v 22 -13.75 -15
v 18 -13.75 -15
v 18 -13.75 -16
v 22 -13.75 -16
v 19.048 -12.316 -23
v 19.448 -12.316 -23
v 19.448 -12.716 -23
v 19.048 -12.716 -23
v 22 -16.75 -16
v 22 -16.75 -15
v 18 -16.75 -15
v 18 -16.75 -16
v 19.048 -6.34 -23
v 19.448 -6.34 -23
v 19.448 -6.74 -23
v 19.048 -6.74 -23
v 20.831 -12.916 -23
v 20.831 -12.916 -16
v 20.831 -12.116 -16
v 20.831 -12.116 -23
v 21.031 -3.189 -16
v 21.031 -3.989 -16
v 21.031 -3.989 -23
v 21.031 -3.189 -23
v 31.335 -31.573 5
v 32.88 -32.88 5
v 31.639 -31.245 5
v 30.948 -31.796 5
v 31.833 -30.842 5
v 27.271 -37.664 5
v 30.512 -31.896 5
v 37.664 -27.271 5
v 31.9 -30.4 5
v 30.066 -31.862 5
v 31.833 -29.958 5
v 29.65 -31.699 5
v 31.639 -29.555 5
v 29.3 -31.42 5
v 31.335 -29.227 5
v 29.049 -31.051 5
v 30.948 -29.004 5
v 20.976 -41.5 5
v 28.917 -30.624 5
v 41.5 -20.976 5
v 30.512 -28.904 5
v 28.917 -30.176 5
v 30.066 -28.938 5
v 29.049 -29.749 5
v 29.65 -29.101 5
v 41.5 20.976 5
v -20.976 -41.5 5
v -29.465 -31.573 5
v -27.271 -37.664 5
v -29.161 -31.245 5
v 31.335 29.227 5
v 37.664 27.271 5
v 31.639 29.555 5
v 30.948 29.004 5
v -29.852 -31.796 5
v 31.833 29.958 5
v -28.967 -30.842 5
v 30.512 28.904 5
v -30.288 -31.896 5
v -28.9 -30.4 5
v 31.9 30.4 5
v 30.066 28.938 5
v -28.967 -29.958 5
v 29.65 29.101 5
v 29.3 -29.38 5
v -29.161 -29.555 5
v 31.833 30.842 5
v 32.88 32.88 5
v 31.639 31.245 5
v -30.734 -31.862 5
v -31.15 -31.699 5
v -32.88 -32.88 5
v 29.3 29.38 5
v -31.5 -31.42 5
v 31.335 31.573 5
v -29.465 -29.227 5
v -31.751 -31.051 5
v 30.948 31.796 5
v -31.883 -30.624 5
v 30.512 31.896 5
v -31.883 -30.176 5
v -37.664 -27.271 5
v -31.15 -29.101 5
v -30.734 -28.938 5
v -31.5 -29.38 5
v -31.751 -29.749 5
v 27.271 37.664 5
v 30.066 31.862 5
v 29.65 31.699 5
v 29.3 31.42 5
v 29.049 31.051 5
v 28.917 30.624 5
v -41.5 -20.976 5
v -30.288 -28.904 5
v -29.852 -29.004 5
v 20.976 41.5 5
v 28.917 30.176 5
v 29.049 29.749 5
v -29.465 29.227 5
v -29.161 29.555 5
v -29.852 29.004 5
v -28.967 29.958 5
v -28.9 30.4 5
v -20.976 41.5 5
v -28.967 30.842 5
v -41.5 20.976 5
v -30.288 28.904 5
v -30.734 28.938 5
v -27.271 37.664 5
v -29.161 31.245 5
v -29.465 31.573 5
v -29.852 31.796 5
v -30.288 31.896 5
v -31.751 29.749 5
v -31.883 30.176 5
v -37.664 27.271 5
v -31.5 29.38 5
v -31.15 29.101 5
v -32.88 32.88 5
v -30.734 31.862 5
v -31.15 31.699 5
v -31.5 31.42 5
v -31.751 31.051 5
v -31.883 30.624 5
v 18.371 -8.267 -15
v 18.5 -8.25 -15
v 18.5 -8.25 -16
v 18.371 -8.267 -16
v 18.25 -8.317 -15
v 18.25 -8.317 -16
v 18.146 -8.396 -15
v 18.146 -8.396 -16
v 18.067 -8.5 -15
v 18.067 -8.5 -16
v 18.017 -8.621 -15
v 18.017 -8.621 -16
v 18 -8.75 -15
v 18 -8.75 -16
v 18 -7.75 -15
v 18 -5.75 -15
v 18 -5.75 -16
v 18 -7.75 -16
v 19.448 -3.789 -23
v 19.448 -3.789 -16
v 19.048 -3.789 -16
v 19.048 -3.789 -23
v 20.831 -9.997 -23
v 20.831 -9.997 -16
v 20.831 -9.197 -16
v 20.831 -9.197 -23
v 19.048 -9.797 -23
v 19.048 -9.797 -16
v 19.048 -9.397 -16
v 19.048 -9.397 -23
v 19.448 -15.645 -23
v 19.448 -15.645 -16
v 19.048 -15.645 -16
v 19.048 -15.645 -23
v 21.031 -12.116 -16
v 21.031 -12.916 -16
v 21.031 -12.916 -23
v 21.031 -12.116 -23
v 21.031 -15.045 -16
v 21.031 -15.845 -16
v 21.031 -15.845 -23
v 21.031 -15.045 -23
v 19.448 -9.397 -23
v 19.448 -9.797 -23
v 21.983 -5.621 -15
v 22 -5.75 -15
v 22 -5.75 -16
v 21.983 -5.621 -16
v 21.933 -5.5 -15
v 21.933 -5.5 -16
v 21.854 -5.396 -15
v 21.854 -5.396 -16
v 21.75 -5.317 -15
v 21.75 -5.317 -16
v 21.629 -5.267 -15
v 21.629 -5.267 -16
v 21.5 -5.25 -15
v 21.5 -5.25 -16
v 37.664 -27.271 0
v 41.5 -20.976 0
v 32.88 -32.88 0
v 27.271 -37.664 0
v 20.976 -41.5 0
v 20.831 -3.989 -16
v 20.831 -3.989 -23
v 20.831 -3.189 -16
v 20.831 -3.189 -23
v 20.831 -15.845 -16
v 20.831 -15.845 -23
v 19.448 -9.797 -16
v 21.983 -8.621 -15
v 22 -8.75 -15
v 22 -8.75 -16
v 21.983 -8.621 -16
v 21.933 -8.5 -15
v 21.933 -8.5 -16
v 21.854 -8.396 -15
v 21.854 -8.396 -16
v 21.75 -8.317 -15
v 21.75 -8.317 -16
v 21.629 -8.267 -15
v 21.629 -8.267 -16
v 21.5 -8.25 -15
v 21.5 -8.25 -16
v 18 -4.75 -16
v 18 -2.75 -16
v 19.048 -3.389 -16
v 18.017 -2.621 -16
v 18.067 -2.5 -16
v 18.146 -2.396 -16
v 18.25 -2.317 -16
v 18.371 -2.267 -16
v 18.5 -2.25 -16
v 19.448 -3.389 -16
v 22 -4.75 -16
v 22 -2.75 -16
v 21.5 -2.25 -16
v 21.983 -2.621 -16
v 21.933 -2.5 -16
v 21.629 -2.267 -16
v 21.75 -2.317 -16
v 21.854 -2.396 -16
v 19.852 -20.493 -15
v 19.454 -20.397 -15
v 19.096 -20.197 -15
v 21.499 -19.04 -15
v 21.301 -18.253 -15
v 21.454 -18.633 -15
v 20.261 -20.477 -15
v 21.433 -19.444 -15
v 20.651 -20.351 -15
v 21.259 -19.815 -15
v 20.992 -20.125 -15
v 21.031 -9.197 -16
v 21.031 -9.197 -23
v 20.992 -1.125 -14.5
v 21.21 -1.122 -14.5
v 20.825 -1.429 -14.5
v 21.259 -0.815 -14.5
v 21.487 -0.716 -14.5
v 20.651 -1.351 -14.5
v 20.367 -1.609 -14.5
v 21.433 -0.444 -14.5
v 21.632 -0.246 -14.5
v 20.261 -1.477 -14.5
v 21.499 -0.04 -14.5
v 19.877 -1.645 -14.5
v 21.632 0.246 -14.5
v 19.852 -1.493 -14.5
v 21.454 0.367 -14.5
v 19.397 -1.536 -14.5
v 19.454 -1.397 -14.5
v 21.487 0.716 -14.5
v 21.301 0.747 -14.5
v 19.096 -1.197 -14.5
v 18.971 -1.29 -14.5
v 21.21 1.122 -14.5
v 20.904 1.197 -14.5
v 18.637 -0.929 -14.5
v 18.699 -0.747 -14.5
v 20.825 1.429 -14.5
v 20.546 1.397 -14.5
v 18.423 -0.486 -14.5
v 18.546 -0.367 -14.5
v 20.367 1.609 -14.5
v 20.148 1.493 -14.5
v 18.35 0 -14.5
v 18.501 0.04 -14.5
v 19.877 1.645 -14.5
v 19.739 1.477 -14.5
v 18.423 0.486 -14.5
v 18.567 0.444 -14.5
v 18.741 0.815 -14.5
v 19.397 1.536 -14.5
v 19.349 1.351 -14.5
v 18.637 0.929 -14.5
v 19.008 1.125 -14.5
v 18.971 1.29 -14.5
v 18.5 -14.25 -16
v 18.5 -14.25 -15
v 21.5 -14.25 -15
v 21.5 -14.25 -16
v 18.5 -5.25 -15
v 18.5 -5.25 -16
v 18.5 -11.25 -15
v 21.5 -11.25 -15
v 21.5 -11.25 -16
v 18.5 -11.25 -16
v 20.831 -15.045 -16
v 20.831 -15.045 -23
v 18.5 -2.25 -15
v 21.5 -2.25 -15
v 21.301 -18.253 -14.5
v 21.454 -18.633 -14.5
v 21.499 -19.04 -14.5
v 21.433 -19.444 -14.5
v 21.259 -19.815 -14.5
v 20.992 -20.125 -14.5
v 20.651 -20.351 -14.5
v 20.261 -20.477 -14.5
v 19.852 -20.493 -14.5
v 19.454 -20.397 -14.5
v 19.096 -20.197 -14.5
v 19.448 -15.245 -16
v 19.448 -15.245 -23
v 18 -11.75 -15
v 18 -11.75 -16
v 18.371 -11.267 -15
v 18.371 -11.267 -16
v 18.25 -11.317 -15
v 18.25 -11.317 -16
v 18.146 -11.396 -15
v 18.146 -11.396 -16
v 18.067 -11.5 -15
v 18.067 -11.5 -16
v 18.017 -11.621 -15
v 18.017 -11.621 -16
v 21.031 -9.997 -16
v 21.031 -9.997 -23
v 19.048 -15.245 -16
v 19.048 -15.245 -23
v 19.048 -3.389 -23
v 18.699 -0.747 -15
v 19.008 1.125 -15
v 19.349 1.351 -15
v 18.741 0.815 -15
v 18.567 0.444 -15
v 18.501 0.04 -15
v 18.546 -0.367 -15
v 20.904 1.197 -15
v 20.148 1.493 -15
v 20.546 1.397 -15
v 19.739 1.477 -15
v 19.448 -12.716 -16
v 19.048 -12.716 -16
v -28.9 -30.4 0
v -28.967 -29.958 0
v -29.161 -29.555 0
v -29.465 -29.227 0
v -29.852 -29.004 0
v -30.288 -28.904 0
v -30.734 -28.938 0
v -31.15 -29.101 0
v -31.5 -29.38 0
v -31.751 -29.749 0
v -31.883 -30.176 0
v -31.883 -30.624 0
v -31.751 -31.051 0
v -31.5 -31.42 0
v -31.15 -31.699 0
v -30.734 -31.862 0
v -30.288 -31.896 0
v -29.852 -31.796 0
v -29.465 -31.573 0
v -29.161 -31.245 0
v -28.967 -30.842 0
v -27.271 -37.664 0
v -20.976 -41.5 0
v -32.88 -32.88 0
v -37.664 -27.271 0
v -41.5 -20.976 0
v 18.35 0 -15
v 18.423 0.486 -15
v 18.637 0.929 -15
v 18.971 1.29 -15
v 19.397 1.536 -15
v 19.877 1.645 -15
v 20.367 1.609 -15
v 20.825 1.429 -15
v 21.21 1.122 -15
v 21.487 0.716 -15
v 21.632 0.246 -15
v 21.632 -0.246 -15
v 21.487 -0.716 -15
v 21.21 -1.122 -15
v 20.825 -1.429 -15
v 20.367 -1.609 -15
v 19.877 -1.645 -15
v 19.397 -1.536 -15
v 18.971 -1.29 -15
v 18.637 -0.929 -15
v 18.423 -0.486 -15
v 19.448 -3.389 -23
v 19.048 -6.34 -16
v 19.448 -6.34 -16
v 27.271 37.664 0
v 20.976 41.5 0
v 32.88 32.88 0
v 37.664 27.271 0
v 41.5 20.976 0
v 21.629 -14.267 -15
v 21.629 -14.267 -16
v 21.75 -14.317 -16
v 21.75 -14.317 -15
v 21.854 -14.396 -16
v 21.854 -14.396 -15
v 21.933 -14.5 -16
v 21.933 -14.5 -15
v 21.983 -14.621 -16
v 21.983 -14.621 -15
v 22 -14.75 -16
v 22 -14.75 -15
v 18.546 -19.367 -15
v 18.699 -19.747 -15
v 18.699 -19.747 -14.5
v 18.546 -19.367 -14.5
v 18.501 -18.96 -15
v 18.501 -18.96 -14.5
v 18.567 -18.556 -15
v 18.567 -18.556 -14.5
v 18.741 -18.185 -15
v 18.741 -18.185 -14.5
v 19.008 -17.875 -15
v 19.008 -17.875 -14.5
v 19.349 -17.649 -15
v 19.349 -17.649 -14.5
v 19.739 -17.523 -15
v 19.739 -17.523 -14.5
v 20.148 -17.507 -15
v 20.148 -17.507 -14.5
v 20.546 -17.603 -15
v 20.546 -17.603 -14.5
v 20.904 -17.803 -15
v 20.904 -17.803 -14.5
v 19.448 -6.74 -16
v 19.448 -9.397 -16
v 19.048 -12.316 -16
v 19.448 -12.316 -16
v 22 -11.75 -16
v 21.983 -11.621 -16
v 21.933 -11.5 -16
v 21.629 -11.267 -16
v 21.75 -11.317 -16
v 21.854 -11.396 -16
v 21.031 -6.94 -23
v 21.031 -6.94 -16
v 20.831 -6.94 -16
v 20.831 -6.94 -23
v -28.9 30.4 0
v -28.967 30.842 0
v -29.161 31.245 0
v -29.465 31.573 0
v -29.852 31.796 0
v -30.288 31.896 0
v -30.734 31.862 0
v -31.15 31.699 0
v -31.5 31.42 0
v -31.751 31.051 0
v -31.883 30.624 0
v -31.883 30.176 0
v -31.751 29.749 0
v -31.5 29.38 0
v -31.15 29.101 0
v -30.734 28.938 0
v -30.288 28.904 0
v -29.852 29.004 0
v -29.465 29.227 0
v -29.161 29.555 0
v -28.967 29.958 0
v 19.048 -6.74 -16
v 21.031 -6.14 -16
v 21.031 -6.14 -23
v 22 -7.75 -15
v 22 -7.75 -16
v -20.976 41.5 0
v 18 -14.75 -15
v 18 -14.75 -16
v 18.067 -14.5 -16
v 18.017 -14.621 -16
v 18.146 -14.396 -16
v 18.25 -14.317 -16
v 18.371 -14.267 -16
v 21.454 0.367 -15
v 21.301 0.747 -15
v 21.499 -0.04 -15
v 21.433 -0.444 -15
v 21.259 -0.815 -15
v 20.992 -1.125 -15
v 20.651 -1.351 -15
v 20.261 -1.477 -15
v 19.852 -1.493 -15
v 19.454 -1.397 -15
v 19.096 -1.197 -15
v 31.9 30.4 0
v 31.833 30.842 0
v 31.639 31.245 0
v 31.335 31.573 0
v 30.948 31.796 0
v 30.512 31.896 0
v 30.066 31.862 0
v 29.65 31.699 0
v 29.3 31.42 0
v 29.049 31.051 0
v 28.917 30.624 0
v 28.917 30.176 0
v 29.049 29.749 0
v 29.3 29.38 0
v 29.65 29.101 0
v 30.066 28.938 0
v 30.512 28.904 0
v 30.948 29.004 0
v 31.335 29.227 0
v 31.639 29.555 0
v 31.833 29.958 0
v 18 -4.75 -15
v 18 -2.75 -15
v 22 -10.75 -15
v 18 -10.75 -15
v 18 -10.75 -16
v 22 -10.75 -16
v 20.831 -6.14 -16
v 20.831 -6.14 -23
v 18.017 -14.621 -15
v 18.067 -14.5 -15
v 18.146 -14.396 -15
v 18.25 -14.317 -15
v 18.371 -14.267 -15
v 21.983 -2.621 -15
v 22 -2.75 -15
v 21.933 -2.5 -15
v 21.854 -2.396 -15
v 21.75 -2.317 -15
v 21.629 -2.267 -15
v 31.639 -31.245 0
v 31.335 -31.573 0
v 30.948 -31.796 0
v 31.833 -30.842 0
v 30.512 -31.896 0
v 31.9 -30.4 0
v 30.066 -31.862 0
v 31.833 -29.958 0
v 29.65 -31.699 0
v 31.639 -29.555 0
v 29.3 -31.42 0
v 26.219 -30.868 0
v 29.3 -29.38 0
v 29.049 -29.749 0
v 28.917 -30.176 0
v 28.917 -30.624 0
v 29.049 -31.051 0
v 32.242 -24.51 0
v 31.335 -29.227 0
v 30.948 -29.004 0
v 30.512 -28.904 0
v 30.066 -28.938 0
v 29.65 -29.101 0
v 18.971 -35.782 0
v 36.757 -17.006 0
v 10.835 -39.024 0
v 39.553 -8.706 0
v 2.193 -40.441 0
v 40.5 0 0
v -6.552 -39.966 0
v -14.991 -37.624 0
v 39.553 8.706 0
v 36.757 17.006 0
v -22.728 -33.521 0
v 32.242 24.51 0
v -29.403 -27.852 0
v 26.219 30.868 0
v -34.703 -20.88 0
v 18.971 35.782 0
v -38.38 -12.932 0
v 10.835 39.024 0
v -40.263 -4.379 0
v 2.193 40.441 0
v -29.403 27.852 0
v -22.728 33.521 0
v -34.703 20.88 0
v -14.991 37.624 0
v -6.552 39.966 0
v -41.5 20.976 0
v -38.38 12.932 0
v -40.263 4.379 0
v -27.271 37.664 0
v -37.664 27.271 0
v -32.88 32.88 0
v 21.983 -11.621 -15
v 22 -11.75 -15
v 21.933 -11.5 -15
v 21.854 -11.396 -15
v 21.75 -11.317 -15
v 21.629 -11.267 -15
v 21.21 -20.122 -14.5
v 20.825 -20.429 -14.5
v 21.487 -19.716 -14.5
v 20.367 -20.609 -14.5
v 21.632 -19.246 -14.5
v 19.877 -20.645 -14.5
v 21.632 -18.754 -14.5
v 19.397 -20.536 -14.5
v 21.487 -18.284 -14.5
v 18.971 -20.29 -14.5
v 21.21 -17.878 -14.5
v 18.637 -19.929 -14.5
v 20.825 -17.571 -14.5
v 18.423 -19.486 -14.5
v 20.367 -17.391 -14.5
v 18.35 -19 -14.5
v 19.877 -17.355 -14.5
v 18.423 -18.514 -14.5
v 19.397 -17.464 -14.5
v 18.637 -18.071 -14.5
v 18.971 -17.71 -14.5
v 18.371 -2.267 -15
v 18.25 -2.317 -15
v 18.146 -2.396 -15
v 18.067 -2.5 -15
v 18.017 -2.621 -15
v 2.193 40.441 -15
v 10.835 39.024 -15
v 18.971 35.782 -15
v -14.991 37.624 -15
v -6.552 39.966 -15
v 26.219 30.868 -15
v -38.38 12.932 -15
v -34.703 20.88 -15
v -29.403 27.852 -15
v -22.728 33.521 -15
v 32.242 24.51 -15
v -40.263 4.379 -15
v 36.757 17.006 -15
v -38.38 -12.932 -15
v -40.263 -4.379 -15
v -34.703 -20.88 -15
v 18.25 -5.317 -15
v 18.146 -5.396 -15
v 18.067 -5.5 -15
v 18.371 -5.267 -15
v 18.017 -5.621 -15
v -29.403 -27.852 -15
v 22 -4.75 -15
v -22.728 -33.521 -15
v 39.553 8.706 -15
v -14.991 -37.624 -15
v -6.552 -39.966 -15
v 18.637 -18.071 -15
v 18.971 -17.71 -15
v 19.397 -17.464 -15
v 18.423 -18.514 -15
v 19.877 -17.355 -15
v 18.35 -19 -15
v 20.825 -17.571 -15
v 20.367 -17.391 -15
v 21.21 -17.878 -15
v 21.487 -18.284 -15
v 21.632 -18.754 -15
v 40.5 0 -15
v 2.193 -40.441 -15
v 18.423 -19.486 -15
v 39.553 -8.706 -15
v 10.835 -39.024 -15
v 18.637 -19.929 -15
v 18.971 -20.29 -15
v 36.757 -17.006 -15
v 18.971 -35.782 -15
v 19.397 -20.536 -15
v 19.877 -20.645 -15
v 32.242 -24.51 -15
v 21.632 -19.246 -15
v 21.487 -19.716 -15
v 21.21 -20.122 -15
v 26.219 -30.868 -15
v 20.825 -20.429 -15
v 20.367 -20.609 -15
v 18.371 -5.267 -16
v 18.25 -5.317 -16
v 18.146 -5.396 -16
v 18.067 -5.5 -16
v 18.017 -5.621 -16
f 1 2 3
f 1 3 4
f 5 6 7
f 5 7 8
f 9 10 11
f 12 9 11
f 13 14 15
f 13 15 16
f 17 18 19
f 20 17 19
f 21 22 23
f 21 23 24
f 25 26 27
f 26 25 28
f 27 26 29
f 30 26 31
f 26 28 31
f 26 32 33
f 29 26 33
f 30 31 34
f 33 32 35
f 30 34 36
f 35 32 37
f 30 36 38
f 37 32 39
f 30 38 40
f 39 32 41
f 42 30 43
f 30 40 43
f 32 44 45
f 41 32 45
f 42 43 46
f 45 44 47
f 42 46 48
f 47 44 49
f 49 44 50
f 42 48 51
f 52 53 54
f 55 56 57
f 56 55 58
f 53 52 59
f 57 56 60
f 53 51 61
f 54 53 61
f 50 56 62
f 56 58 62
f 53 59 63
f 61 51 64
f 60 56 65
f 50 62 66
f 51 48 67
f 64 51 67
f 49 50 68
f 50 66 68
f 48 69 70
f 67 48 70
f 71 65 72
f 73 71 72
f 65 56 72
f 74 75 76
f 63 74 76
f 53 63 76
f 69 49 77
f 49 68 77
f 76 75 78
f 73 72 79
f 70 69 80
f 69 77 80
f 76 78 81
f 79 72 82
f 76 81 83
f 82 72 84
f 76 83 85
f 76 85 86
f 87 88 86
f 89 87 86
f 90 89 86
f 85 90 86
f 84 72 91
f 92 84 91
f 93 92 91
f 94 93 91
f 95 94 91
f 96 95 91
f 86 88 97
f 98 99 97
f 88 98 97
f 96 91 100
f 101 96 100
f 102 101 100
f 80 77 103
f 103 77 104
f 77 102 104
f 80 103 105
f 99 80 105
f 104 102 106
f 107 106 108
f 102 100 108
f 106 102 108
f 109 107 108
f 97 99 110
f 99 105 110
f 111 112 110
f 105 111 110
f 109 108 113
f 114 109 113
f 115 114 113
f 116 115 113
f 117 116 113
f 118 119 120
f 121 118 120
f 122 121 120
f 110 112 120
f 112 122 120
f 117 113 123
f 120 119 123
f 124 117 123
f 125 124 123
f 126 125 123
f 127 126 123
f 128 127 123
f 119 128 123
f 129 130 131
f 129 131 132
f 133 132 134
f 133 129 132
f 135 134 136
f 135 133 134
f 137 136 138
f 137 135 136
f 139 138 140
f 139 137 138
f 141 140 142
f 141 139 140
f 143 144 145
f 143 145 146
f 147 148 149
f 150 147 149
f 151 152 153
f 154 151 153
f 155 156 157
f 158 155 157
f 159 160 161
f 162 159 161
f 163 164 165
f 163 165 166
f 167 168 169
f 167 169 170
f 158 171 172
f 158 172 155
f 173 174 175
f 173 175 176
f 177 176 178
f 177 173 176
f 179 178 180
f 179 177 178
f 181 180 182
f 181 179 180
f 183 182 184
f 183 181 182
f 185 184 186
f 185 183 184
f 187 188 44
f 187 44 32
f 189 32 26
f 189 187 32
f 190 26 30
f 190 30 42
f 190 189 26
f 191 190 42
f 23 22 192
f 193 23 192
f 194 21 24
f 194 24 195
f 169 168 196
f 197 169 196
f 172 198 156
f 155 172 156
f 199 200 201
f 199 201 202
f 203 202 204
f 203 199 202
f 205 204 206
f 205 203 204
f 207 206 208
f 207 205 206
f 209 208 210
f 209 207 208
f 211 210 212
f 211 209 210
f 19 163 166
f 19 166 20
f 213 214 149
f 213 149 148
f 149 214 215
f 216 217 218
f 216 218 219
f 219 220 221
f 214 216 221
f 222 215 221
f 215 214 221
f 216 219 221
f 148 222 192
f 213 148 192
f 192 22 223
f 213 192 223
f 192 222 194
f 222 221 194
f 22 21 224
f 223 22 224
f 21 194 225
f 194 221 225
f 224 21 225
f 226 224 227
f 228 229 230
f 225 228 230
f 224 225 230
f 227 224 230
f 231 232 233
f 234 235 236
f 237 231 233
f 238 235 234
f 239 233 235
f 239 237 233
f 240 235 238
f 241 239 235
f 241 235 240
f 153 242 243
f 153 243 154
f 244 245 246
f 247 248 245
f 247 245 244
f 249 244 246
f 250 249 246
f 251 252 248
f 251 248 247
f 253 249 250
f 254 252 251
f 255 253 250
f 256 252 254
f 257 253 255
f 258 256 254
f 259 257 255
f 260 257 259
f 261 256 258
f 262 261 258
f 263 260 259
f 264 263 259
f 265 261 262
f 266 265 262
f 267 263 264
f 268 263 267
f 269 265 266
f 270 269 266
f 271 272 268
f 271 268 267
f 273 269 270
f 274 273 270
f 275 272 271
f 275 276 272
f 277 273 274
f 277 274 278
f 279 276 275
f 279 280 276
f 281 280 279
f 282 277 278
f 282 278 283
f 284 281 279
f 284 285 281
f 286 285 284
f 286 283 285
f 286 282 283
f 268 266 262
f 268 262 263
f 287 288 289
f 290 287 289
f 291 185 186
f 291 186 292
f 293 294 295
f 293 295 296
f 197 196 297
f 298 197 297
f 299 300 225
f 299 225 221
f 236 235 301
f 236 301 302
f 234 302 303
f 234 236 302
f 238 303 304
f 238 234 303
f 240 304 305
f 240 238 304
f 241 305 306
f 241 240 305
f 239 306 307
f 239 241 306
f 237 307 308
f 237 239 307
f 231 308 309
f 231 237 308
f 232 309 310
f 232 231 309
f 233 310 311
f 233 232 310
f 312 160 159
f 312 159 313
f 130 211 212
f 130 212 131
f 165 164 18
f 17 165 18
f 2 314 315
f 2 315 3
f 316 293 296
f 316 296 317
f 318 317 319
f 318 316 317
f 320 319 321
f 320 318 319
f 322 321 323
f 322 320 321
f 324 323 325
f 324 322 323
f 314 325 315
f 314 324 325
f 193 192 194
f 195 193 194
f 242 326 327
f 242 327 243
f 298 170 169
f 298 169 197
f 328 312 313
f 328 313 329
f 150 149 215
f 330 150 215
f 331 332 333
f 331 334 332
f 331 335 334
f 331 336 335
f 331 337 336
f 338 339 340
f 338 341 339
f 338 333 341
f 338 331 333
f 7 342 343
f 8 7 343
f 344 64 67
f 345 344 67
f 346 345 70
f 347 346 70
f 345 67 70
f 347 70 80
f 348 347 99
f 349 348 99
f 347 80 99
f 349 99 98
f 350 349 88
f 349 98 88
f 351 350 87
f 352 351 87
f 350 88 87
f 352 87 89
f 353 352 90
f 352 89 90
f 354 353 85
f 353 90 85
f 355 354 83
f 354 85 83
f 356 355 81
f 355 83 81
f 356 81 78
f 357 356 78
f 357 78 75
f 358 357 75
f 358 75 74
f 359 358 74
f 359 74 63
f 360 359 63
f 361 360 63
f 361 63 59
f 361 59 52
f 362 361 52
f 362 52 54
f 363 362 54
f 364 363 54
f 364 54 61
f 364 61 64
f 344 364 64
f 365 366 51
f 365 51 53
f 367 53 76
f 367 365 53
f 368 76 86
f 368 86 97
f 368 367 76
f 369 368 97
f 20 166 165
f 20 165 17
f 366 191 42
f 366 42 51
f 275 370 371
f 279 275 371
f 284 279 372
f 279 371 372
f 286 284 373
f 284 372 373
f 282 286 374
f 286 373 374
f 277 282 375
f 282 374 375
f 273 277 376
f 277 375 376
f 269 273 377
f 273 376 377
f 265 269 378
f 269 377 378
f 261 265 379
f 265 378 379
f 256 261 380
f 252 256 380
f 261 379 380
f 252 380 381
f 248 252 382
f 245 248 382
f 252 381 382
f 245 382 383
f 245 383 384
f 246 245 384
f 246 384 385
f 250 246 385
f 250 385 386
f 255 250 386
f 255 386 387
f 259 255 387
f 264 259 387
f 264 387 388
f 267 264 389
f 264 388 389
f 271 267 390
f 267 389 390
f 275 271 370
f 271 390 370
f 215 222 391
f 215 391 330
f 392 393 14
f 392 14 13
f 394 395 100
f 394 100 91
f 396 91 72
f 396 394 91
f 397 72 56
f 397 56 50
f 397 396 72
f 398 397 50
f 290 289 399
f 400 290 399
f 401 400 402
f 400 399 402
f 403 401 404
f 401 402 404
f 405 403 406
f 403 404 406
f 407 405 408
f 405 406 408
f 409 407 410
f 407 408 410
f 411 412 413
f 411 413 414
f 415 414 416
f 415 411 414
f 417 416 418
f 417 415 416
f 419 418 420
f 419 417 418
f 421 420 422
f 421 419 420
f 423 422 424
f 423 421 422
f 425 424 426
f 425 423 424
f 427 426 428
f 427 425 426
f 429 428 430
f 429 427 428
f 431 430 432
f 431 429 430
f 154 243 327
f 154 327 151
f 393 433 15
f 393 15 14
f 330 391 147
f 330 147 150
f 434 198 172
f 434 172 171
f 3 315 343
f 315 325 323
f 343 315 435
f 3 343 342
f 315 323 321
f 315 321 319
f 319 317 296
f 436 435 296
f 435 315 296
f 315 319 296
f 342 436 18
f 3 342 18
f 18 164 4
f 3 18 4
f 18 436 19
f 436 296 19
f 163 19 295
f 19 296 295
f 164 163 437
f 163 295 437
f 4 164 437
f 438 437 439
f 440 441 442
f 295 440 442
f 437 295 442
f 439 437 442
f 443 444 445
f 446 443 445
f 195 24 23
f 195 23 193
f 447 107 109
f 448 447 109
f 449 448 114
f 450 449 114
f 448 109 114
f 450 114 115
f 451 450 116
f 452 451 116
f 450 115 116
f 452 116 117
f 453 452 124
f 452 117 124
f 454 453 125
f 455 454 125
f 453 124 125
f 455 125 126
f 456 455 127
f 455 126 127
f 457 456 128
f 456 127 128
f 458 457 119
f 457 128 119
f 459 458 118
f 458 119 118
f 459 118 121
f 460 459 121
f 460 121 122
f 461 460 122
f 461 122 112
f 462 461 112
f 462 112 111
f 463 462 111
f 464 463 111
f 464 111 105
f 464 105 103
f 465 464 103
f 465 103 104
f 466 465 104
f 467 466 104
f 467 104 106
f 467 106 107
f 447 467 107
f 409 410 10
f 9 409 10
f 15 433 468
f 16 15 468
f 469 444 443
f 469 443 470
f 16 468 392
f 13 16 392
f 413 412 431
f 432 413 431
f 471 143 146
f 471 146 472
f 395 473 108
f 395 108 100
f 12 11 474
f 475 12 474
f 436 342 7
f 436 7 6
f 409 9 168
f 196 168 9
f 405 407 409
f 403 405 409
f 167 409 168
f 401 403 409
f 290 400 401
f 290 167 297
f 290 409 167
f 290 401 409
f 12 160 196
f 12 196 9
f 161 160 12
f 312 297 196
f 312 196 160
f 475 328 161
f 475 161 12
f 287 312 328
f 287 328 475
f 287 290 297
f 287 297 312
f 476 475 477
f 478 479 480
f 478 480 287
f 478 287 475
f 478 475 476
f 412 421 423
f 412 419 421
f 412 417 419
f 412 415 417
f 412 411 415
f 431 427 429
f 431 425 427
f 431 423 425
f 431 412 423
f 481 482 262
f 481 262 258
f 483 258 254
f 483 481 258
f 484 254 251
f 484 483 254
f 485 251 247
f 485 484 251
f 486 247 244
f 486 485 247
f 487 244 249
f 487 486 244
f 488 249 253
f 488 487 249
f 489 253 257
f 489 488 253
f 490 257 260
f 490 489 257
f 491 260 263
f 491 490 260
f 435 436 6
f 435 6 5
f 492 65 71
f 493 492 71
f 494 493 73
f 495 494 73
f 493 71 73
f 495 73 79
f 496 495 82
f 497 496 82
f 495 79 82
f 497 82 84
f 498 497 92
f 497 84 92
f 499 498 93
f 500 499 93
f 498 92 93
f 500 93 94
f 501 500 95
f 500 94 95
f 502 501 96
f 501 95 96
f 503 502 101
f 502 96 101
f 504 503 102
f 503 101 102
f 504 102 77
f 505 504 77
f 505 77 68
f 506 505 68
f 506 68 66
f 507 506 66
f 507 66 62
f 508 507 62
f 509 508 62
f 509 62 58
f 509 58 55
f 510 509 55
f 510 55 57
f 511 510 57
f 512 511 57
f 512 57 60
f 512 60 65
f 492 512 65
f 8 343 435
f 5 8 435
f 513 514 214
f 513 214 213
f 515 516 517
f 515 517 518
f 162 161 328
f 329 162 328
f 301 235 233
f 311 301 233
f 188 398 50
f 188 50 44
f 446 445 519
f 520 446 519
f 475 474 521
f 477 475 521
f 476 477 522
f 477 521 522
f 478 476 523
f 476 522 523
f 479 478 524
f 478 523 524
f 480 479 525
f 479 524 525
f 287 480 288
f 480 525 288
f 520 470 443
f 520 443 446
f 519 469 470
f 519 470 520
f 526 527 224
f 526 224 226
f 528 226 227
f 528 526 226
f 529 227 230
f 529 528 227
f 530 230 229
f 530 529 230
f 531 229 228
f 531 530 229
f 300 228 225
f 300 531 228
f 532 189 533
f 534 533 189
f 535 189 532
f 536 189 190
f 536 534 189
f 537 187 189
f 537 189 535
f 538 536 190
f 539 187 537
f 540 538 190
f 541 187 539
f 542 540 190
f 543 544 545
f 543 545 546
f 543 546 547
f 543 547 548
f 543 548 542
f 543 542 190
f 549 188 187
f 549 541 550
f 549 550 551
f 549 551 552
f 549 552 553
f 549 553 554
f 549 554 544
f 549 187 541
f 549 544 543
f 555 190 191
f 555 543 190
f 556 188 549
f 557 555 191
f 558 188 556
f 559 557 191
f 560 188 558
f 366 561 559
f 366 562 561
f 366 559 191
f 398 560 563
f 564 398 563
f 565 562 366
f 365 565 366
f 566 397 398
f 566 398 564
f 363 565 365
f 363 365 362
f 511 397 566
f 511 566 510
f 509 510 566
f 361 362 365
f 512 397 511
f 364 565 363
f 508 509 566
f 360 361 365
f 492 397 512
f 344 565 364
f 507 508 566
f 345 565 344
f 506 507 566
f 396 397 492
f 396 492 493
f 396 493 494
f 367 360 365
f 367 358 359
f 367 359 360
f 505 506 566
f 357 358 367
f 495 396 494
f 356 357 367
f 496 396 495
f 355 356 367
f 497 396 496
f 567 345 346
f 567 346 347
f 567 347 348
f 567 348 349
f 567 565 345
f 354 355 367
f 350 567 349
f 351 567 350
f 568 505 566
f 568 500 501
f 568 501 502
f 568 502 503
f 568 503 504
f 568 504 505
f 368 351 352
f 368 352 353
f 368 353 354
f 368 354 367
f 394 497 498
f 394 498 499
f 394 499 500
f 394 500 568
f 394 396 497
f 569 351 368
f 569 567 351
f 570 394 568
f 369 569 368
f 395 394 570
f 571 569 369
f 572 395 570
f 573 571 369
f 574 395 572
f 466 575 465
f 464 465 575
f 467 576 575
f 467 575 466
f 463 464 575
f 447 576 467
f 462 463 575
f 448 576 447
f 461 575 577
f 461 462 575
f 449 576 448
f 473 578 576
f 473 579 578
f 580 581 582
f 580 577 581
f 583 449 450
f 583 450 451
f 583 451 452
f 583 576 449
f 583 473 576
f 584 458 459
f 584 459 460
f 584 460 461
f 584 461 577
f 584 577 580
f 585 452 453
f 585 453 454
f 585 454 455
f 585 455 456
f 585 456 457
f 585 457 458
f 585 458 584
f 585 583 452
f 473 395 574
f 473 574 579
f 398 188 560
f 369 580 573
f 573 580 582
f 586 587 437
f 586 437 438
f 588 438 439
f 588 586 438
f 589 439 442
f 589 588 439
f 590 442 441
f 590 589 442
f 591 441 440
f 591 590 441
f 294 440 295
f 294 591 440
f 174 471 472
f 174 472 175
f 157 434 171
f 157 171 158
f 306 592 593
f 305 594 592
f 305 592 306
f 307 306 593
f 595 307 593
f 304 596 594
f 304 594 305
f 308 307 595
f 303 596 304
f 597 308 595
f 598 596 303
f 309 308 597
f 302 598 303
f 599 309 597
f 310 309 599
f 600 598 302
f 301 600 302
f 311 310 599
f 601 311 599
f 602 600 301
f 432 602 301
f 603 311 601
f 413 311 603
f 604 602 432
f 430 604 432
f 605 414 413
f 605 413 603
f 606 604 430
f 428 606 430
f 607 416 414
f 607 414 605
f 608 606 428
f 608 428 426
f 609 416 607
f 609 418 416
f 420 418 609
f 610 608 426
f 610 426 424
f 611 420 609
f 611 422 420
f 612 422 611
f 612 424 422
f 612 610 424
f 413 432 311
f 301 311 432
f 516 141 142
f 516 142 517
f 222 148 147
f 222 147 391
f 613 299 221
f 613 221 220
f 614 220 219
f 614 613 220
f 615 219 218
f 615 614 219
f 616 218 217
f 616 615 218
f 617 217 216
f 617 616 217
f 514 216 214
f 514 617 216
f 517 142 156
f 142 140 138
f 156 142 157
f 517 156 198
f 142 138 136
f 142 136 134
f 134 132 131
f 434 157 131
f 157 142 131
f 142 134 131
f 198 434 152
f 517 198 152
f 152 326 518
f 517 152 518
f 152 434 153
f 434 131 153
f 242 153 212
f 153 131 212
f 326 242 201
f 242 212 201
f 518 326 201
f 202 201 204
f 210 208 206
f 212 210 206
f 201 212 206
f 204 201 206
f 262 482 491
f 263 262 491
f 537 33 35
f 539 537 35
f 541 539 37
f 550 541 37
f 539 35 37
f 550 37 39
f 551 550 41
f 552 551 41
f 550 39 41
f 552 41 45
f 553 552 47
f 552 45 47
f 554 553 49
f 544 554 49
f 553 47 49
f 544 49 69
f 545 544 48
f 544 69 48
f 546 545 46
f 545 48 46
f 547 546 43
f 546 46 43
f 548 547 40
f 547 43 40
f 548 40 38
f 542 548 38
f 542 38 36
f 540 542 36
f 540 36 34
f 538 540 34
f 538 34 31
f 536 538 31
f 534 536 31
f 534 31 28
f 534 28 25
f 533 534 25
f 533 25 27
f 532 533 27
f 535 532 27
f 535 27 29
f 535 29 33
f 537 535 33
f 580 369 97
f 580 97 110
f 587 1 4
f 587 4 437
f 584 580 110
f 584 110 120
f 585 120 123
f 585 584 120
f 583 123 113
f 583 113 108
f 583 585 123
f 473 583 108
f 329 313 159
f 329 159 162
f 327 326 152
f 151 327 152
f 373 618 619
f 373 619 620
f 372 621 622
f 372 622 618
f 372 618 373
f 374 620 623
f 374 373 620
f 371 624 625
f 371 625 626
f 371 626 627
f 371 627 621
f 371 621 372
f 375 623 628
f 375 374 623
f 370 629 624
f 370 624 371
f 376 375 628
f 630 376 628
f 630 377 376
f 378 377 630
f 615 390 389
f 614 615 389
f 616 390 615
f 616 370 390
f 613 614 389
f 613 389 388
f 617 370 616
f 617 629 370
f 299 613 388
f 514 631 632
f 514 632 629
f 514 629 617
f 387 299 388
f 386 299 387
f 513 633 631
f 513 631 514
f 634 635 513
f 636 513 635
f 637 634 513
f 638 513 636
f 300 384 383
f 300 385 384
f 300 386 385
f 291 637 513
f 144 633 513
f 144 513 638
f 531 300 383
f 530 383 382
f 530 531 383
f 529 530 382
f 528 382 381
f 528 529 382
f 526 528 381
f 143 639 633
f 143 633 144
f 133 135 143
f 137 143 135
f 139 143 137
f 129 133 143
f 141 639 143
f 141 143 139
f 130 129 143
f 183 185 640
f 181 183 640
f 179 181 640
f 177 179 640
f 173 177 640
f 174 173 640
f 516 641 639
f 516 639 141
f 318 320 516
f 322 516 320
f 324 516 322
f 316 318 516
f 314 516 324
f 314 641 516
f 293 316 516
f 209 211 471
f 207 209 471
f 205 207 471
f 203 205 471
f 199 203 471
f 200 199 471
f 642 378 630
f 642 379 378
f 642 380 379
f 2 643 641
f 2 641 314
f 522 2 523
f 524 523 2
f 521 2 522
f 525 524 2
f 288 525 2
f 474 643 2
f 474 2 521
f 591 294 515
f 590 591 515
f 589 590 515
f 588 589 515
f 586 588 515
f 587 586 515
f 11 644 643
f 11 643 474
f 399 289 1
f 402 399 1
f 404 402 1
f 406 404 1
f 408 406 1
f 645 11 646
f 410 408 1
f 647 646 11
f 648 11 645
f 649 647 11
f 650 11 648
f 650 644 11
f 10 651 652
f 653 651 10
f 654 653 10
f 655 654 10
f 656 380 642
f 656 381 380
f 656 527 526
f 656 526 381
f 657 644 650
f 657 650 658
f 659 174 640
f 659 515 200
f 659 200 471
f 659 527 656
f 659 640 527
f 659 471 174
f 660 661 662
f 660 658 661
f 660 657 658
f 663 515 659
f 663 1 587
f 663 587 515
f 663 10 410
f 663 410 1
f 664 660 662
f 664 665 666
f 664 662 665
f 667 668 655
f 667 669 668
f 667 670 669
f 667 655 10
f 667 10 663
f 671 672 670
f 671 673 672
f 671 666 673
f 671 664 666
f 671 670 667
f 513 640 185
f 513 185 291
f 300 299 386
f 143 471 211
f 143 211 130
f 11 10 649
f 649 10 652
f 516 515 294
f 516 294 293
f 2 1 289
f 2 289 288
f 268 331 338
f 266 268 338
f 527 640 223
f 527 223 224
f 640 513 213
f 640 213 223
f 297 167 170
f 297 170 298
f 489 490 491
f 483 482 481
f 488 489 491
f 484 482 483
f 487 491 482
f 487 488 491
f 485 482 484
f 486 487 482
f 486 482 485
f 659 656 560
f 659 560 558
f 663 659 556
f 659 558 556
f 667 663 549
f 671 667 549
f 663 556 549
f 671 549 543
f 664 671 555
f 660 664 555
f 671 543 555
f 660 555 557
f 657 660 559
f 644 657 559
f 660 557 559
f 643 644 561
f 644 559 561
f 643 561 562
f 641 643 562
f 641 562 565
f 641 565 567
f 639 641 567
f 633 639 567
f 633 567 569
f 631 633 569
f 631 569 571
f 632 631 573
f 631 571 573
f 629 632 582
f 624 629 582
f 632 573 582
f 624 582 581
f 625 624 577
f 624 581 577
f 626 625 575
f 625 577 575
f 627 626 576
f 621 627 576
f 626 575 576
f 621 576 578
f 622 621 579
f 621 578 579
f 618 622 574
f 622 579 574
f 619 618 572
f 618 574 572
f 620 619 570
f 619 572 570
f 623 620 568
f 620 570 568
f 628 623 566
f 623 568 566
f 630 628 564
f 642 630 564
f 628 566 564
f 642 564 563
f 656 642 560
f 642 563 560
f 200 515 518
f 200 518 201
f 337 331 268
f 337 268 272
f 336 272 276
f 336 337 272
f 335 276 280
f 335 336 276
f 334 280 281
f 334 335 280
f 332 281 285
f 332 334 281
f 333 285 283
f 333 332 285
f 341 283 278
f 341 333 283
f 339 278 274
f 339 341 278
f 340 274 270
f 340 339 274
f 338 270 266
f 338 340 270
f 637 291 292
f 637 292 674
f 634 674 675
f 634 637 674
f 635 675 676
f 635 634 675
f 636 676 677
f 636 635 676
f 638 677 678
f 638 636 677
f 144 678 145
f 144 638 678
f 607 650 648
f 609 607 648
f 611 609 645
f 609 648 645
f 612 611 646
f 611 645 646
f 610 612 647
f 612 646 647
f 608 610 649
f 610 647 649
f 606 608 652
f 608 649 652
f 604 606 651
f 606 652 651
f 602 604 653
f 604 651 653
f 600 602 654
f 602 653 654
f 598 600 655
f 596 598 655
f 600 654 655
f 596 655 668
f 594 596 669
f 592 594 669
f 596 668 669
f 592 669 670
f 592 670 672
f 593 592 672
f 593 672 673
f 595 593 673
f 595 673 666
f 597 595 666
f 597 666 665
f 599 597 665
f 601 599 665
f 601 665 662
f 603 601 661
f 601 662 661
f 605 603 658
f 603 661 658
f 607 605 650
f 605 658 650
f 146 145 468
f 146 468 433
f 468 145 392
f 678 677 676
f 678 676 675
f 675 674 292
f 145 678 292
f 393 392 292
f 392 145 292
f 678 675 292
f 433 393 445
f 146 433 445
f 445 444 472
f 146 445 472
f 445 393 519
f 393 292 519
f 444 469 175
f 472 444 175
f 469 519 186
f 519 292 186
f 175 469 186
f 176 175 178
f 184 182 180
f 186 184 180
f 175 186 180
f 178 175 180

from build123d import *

# Parameters (mm, degrees)
EXTRUDE_1_DEPTH     = 5
SKETCH_2_R          = 1.5
CUT_EXTRUDE_1_DEPTH = 19
SKETCH_3_R          = 40.5
EXTRUDE_2_DEPTH     = 15
EXTRUDE_3_DEPTH     = 1
SKETCH_7_W          = 0.4
SKETCH_7_H          = 0.4
SKETCH_7_W_2        = 0.2
SKETCH_7_H_2        = 0.8
EXTRUDE_4_DEPTH     = 7
SKETCH_8_R          = 1.65
SKETCH_8_R_2        = 1.5
CUT_EXTRUDE_2_DEPTH = 0.5
CUT_EXTRUDE_3_DEPTH = 0.5


with BuildPart() as part:
    # 草图1 → 凸台-拉伸1 (new body)
    with BuildSketch(Plane.XY):
        with BuildLine():
            Line((-20.976176963, 41.5), (20.976176963, 41.5))
            ThreePointArc((20.976176963, 41.5), (32.880465325, 32.880465325), (41.5, 20.976176963))
            Line((41.5, 20.976176963), (41.5, -20.976176963))
            ThreePointArc((41.5, -20.976176963), (32.880465325, -32.880465325), (20.976176963, -41.5))
            Line((20.976176963, -41.5), (-20.976176963, -41.5))
            ThreePointArc((-20.976176963, -41.5), (-32.880465325, -32.880465325), (-41.5, -20.976176963))
            Line((-41.5, -20.976176963), (-41.5, 20.976176963))
            ThreePointArc((-41.5, 20.976176963), (-32.880465325, 32.880465325), (-20.976176963, 41.5))
        make_face()
    extrude(amount=EXTRUDE_1_DEPTH)

    # 草图2 → 切除-拉伸1 (cut)
    with BuildSketch(Plane.XY.offset(5)):
        with Locations((-30.4, 30.4)):
            Circle(SKETCH_2_R)
        with Locations((30.4, 30.4)):
            Circle(SKETCH_2_R)
        with Locations((30.4, -30.4)):
            Circle(SKETCH_2_R)
        with Locations((-30.4, -30.4)):
            Circle(SKETCH_2_R)
    extrude(amount=-CUT_EXTRUDE_1_DEPTH, mode=Mode.SUBTRACT)

    # 草图3 → 凸台-拉伸2 (add)
    with BuildSketch(Plane(origin=(0, 0, 0), x_dir=(-1, 0, 0), z_dir=(0, 0, -1))):
        with Locations(Location((0, 0, 0), (0, 0, 180))):
            Circle(SKETCH_3_R)
    extrude(amount=EXTRUDE_2_DEPTH)

    # 草图6 → 凸台-拉伸3 (add)
    with BuildSketch(Plane(origin=(0, 0, -15), x_dir=(-1, 0, 0), z_dir=(0, 0, -1))):
        with BuildLine():
            Line((-18, -5.75), (-18, -7.75))
            Line((-18, -7.75), (-22, -7.75))
            Line((-22, -7.75), (-22, -5.75))
            ThreePointArc((-22, -5.75), (-21.853553391, -5.396446609), (-21.5, -5.25))
            Line((-21.5, -5.25), (-18.5, -5.25))
            ThreePointArc((-18.5, -5.25), (-18.146446609, -5.396446609), (-18, -5.75))
        make_face()
        with BuildLine():
            Line((-21.5, -8.25), (-18.5, -8.25))
            ThreePointArc((-18.5, -8.25), (-18.146446609, -8.396446609), (-18, -8.75))
            Line((-18, -8.75), (-18, -10.75))
            Line((-18, -10.75), (-22, -10.75))
            Line((-22, -10.75), (-22, -8.75))
            ThreePointArc((-22, -8.75), (-21.853553391, -8.396446609), (-21.5, -8.25))
        make_face()
        with BuildLine():
            Line((-18, -2.75), (-18, -4.75))
            Line((-18, -4.75), (-22, -4.75))
            Line((-22, -4.75), (-22, -2.75))
            ThreePointArc((-22, -2.75), (-21.853553391, -2.396446609), (-21.5, -2.25))
            Line((-21.5, -2.25), (-18.5, -2.25))
            ThreePointArc((-18.5, -2.25), (-18.146446609, -2.396446609), (-18, -2.75))
        make_face()
        with BuildLine():
            Line((-21.5, -11.25), (-18.5, -11.25))
            ThreePointArc((-18.5, -11.25), (-18.146446609, -11.396446609), (-18, -11.75))
            Line((-18, -11.75), (-18, -13.75))
            Line((-18, -13.75), (-22, -13.75))
            Line((-22, -13.75), (-22, -11.75))
            ThreePointArc((-22, -11.75), (-21.853553391, -11.396446609), (-21.5, -11.25))
        make_face()
        with BuildLine():
            Line((-22, -14.75), (-22, -16.75))
            Line((-22, -16.75), (-18, -16.75))
            Line((-18, -16.75), (-18, -14.75))
            ThreePointArc((-18, -14.75), (-18.146446609, -14.396446609), (-18.5, -14.25))
            Line((-18.5, -14.25), (-21.5, -14.25))
            ThreePointArc((-21.5, -14.25), (-21.853553391, -14.396446609), (-22, -14.75))
        make_face()
    extrude(amount=EXTRUDE_3_DEPTH)

    # 草图7 → 凸台-拉伸4 (add)
    with BuildSketch(Plane(origin=(0, 0, -16), x_dir=(-1, 0, 0), z_dir=(0, 0, -1))):
        with Locations((-19.248388447, -6.540012069)):
            Rectangle(SKETCH_7_W, SKETCH_7_H)
        with Locations((-20.931423751, -3.588755831)):
            Rectangle(SKETCH_7_W_2, SKETCH_7_H_2)
        with Locations((-19.248388447, -3.588755831)):
            Rectangle(SKETCH_7_W, SKETCH_7_H)
        with Locations((-20.931423751, -6.540012069)):
            Rectangle(SKETCH_7_W_2, SKETCH_7_H_2)
        with Locations((-19.248388447, -9.597001128)):
            Rectangle(SKETCH_7_W, SKETCH_7_H)
        with Locations((-20.931423751, -9.597001128)):
            Rectangle(SKETCH_7_W_2, SKETCH_7_H_2)
        with Locations((-20.931423751, -12.516173633)):
            Rectangle(SKETCH_7_W_2, SKETCH_7_H_2)
        with Locations((-19.248388447, -12.516173633)):
            Rectangle(SKETCH_7_W, SKETCH_7_H)
        with Locations((-19.248388447, -15.44492275)):
            Rectangle(SKETCH_7_W, SKETCH_7_H)
        with Locations((-20.931423751, -15.44492275)):
            Rectangle(SKETCH_7_W_2, SKETCH_7_H_2)
    extrude(amount=EXTRUDE_4_DEPTH)

    # 草图8 → 切除-拉伸2 (cut)
    # profile 1 of 2: a face of its own
    with BuildSketch(Plane(origin=(0, 0, -15), x_dir=(-1, 0, 0), z_dir=(0, 0, -1))):
        with Locations((-20, 0)):
            Circle(SKETCH_8_R)
        with Locations((-20, 0)):
            Circle(SKETCH_8_R_2, mode=Mode.SUBTRACT)
    # profile 2 of 2: a face of its own
    with BuildSketch(Plane(origin=(0, 0, -15), x_dir=(-1, 0, 0), z_dir=(0, 0, -1))):
        with Locations((-20, -19)):
            Circle(SKETCH_8_R)
        with Locations((-20, -19)):
            Circle(SKETCH_8_R_2, mode=Mode.SUBTRACT)
    extrude(amount=-CUT_EXTRUDE_2_DEPTH, mode=Mode.SUBTRACT)

    # 草图9 → 切除-拉伸3 (cut)
    with BuildSketch(Plane(origin=(0, 0, -15), x_dir=(-1, 0, 0), z_dir=(0, 0, -1))):
        with BuildLine():
            Line((-21.300685051, 0.747140146), (-19.096187693, -1.197131285))
            ThreePointArc((-19.096187693, -1.197131285), (-18.875022153, -0.99218186), (-18.699314949, -0.747140146))
            Line((-18.699314949, -0.747140146), (-20.903812307, 1.197131285))
            ThreePointArc((-20.903812307, 1.197131285), (-21.124977847, 0.99218186), (-21.300685051, 0.747140146))
        make_face()
        with BuildLine():
            Line((-21.300685051, -18.252859854), (-19.096187693, -20.197131285))
            ThreePointArc((-19.096187693, -20.197131285), (-18.875022153, -19.99218186), (-18.699314949, -19.747140146))
            Line((-18.699314949, -19.747140146), (-20.903812307, -17.802868715))
            ThreePointArc((-20.903812307, -17.802868715), (-21.124977847, -18.00781814), (-21.300685051, -18.252859854))
        make_face()
    extrude(amount=-CUT_EXTRUDE_3_DEPTH, mode=Mode.SUBTRACT)


solid = part.part
